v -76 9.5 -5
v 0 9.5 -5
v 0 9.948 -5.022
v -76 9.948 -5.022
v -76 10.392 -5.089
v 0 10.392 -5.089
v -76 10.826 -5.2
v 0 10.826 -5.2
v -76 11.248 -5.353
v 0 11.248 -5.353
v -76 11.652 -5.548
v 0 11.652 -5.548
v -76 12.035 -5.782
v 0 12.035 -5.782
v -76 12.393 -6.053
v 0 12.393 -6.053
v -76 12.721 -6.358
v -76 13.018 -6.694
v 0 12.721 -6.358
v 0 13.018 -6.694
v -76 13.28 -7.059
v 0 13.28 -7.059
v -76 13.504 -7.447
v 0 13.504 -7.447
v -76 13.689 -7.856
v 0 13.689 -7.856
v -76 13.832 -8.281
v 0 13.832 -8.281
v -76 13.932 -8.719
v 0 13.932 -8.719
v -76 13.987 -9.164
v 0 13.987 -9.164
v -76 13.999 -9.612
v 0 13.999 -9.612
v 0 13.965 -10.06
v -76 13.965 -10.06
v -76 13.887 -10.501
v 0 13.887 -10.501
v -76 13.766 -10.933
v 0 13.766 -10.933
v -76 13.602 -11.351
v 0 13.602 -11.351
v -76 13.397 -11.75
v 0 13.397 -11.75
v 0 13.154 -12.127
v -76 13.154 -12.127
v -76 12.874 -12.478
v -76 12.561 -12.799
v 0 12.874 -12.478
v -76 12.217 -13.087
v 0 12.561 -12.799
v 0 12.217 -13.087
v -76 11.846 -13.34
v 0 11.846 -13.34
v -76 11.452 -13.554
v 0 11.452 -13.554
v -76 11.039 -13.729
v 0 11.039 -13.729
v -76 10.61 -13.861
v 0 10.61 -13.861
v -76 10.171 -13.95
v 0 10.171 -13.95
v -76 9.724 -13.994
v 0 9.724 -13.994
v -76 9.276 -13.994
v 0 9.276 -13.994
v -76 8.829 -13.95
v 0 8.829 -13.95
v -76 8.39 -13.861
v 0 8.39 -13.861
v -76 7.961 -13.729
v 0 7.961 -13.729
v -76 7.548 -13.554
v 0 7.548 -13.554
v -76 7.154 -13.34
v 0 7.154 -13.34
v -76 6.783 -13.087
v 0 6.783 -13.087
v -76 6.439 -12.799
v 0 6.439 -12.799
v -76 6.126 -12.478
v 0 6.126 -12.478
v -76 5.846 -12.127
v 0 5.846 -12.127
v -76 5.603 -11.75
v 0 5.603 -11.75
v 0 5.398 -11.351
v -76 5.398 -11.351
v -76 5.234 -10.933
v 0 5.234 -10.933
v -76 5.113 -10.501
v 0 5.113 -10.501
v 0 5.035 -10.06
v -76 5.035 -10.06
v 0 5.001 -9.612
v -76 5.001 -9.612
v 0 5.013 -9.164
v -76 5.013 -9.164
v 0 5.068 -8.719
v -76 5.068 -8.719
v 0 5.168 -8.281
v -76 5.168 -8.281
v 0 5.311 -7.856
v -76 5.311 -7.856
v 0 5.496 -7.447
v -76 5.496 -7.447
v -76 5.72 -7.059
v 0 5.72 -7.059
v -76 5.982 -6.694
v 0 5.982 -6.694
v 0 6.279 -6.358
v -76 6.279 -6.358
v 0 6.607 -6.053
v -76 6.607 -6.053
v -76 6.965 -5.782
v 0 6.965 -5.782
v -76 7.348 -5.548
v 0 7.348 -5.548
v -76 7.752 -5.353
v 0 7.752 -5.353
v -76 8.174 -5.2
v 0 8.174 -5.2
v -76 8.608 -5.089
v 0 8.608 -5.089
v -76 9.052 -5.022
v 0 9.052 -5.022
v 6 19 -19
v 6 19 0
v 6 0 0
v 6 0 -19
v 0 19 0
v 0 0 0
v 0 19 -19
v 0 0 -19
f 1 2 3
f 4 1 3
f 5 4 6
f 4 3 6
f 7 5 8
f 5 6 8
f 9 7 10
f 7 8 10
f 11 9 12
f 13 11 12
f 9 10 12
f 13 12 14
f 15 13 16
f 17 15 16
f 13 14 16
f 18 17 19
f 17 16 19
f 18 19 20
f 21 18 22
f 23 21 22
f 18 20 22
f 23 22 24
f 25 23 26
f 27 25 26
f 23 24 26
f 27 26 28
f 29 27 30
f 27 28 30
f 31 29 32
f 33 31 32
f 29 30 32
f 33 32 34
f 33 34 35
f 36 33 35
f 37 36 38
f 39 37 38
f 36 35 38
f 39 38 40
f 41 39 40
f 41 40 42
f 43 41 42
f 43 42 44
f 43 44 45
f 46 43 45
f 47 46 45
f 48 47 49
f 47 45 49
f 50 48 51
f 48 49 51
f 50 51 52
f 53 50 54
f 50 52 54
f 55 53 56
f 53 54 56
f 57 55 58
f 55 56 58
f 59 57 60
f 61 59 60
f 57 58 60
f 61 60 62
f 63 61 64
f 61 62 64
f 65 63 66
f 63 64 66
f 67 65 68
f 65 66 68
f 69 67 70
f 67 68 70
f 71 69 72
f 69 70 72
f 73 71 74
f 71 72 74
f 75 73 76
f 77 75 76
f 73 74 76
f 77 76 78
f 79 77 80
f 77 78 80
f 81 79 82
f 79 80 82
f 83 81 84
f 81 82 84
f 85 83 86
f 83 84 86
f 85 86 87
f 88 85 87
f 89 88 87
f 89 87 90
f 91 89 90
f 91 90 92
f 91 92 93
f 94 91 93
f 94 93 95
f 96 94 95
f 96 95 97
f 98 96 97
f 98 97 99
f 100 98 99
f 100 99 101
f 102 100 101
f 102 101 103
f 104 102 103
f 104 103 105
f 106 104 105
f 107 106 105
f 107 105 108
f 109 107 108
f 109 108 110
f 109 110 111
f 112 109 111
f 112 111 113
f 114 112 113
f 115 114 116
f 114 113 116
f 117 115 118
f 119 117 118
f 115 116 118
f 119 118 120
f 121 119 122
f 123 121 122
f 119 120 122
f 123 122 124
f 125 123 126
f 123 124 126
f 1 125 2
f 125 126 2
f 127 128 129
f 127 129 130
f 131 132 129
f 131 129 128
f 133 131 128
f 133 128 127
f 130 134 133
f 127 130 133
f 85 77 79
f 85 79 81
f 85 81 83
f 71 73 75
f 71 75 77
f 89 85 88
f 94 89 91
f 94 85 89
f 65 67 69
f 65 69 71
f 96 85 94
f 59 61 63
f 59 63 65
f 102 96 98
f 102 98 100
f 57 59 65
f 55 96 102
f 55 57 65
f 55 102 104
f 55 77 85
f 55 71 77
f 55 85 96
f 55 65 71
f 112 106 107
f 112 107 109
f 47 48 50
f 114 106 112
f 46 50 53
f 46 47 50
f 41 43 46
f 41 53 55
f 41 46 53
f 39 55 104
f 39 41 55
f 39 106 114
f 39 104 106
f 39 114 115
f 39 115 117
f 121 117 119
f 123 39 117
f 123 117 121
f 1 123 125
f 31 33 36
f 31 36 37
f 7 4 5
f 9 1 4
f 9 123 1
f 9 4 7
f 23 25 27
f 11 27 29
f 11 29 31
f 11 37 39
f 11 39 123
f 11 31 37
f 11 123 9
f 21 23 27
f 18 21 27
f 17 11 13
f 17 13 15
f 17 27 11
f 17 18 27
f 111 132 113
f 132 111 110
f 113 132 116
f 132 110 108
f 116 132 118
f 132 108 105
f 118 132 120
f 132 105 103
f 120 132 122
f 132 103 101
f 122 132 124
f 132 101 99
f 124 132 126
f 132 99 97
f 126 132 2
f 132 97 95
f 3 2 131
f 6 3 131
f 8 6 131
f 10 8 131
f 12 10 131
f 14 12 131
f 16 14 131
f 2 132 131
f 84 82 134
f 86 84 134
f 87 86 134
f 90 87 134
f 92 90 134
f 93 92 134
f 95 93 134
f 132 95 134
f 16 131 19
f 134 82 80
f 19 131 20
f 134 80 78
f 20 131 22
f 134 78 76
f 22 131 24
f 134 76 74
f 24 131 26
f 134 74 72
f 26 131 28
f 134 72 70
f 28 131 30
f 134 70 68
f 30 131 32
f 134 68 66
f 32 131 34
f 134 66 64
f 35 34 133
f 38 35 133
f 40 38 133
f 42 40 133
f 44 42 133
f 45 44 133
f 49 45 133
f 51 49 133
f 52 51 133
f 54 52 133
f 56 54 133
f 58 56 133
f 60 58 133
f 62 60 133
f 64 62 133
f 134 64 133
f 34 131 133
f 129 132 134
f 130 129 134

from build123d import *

# Parameters (mm, degrees)
SKETCH2_W           = 19
SKETCH2_H           = 19
BOSS_EXTRUDE1_DEPTH = 6
SKETCH3_R           = 4.5
BOSS_EXTRUDE2_DEPTH = 76


with BuildPart() as part:
    # Sketch2 → Boss-Extrude1 (new body)
    with BuildSketch(Plane(origin=(0, 0, 0), x_dir=(0, 0, -1), z_dir=(1, 0, 0))):
        with Locations((9.5, 9.5)):
            Rectangle(SKETCH2_W, SKETCH2_H)
    extrude(amount=BOSS_EXTRUDE1_DEPTH)

    # Sketch3 → Boss-Extrude2 (add)
    with BuildSketch(Plane.ZY):
        with Locations((-9.5, 9.5)):
            Circle(SKETCH3_R)
    extrude(amount=BOSS_EXTRUDE2_DEPTH)


solid = part.part
